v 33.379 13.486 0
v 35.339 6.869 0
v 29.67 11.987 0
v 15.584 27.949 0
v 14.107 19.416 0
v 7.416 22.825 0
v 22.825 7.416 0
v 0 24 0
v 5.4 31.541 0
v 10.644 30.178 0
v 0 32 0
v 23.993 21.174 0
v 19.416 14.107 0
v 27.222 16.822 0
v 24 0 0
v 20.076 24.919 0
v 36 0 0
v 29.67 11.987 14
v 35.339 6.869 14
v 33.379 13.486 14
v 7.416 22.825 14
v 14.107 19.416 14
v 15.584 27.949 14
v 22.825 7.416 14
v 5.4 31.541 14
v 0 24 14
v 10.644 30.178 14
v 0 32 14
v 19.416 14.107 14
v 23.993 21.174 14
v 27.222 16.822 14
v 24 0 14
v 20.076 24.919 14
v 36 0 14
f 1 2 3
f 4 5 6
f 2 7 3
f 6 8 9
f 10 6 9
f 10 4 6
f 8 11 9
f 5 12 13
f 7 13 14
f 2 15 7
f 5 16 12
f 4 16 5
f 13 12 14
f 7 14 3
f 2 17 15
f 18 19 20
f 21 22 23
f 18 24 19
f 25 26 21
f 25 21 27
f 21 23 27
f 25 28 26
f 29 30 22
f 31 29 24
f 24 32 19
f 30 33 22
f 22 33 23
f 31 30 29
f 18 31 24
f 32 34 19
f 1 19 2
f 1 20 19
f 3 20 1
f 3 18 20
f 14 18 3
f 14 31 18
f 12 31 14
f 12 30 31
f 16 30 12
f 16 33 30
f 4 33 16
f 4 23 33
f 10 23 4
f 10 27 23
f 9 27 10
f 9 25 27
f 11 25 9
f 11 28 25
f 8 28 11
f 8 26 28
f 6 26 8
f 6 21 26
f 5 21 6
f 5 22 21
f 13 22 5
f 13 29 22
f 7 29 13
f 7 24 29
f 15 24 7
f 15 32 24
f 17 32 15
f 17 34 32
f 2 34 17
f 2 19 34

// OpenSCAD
$fn = 32;

// ----------------------------------------------------------------------
// Arc stop: segment, 14 mm thick
// ----------------------------------------------------------------------

// --- parameters (mm) ---
profile_height = 14;      // extrusion height
profile_points = 17;      // points of the closed outline

profile = [[36, 0], [35.339, 6.869], [33.379, 13.486], [29.67, 11.987], [27.222, 16.822], [23.993, 21.174], [20.076, 24.919], [15.584, 27.949], [10.644, 30.178], [5.4, 31.541], [0, 32], [0, 24], [7.416, 22.825], [14.107, 19.416], [19.416, 14.107], [22.825, 7.416], [24, 0]];  // single closed polygon, 17 points, counter clockwise

// --- the one profile operation ---
linear_extrude(height = profile_height) polygon(points = profile);
